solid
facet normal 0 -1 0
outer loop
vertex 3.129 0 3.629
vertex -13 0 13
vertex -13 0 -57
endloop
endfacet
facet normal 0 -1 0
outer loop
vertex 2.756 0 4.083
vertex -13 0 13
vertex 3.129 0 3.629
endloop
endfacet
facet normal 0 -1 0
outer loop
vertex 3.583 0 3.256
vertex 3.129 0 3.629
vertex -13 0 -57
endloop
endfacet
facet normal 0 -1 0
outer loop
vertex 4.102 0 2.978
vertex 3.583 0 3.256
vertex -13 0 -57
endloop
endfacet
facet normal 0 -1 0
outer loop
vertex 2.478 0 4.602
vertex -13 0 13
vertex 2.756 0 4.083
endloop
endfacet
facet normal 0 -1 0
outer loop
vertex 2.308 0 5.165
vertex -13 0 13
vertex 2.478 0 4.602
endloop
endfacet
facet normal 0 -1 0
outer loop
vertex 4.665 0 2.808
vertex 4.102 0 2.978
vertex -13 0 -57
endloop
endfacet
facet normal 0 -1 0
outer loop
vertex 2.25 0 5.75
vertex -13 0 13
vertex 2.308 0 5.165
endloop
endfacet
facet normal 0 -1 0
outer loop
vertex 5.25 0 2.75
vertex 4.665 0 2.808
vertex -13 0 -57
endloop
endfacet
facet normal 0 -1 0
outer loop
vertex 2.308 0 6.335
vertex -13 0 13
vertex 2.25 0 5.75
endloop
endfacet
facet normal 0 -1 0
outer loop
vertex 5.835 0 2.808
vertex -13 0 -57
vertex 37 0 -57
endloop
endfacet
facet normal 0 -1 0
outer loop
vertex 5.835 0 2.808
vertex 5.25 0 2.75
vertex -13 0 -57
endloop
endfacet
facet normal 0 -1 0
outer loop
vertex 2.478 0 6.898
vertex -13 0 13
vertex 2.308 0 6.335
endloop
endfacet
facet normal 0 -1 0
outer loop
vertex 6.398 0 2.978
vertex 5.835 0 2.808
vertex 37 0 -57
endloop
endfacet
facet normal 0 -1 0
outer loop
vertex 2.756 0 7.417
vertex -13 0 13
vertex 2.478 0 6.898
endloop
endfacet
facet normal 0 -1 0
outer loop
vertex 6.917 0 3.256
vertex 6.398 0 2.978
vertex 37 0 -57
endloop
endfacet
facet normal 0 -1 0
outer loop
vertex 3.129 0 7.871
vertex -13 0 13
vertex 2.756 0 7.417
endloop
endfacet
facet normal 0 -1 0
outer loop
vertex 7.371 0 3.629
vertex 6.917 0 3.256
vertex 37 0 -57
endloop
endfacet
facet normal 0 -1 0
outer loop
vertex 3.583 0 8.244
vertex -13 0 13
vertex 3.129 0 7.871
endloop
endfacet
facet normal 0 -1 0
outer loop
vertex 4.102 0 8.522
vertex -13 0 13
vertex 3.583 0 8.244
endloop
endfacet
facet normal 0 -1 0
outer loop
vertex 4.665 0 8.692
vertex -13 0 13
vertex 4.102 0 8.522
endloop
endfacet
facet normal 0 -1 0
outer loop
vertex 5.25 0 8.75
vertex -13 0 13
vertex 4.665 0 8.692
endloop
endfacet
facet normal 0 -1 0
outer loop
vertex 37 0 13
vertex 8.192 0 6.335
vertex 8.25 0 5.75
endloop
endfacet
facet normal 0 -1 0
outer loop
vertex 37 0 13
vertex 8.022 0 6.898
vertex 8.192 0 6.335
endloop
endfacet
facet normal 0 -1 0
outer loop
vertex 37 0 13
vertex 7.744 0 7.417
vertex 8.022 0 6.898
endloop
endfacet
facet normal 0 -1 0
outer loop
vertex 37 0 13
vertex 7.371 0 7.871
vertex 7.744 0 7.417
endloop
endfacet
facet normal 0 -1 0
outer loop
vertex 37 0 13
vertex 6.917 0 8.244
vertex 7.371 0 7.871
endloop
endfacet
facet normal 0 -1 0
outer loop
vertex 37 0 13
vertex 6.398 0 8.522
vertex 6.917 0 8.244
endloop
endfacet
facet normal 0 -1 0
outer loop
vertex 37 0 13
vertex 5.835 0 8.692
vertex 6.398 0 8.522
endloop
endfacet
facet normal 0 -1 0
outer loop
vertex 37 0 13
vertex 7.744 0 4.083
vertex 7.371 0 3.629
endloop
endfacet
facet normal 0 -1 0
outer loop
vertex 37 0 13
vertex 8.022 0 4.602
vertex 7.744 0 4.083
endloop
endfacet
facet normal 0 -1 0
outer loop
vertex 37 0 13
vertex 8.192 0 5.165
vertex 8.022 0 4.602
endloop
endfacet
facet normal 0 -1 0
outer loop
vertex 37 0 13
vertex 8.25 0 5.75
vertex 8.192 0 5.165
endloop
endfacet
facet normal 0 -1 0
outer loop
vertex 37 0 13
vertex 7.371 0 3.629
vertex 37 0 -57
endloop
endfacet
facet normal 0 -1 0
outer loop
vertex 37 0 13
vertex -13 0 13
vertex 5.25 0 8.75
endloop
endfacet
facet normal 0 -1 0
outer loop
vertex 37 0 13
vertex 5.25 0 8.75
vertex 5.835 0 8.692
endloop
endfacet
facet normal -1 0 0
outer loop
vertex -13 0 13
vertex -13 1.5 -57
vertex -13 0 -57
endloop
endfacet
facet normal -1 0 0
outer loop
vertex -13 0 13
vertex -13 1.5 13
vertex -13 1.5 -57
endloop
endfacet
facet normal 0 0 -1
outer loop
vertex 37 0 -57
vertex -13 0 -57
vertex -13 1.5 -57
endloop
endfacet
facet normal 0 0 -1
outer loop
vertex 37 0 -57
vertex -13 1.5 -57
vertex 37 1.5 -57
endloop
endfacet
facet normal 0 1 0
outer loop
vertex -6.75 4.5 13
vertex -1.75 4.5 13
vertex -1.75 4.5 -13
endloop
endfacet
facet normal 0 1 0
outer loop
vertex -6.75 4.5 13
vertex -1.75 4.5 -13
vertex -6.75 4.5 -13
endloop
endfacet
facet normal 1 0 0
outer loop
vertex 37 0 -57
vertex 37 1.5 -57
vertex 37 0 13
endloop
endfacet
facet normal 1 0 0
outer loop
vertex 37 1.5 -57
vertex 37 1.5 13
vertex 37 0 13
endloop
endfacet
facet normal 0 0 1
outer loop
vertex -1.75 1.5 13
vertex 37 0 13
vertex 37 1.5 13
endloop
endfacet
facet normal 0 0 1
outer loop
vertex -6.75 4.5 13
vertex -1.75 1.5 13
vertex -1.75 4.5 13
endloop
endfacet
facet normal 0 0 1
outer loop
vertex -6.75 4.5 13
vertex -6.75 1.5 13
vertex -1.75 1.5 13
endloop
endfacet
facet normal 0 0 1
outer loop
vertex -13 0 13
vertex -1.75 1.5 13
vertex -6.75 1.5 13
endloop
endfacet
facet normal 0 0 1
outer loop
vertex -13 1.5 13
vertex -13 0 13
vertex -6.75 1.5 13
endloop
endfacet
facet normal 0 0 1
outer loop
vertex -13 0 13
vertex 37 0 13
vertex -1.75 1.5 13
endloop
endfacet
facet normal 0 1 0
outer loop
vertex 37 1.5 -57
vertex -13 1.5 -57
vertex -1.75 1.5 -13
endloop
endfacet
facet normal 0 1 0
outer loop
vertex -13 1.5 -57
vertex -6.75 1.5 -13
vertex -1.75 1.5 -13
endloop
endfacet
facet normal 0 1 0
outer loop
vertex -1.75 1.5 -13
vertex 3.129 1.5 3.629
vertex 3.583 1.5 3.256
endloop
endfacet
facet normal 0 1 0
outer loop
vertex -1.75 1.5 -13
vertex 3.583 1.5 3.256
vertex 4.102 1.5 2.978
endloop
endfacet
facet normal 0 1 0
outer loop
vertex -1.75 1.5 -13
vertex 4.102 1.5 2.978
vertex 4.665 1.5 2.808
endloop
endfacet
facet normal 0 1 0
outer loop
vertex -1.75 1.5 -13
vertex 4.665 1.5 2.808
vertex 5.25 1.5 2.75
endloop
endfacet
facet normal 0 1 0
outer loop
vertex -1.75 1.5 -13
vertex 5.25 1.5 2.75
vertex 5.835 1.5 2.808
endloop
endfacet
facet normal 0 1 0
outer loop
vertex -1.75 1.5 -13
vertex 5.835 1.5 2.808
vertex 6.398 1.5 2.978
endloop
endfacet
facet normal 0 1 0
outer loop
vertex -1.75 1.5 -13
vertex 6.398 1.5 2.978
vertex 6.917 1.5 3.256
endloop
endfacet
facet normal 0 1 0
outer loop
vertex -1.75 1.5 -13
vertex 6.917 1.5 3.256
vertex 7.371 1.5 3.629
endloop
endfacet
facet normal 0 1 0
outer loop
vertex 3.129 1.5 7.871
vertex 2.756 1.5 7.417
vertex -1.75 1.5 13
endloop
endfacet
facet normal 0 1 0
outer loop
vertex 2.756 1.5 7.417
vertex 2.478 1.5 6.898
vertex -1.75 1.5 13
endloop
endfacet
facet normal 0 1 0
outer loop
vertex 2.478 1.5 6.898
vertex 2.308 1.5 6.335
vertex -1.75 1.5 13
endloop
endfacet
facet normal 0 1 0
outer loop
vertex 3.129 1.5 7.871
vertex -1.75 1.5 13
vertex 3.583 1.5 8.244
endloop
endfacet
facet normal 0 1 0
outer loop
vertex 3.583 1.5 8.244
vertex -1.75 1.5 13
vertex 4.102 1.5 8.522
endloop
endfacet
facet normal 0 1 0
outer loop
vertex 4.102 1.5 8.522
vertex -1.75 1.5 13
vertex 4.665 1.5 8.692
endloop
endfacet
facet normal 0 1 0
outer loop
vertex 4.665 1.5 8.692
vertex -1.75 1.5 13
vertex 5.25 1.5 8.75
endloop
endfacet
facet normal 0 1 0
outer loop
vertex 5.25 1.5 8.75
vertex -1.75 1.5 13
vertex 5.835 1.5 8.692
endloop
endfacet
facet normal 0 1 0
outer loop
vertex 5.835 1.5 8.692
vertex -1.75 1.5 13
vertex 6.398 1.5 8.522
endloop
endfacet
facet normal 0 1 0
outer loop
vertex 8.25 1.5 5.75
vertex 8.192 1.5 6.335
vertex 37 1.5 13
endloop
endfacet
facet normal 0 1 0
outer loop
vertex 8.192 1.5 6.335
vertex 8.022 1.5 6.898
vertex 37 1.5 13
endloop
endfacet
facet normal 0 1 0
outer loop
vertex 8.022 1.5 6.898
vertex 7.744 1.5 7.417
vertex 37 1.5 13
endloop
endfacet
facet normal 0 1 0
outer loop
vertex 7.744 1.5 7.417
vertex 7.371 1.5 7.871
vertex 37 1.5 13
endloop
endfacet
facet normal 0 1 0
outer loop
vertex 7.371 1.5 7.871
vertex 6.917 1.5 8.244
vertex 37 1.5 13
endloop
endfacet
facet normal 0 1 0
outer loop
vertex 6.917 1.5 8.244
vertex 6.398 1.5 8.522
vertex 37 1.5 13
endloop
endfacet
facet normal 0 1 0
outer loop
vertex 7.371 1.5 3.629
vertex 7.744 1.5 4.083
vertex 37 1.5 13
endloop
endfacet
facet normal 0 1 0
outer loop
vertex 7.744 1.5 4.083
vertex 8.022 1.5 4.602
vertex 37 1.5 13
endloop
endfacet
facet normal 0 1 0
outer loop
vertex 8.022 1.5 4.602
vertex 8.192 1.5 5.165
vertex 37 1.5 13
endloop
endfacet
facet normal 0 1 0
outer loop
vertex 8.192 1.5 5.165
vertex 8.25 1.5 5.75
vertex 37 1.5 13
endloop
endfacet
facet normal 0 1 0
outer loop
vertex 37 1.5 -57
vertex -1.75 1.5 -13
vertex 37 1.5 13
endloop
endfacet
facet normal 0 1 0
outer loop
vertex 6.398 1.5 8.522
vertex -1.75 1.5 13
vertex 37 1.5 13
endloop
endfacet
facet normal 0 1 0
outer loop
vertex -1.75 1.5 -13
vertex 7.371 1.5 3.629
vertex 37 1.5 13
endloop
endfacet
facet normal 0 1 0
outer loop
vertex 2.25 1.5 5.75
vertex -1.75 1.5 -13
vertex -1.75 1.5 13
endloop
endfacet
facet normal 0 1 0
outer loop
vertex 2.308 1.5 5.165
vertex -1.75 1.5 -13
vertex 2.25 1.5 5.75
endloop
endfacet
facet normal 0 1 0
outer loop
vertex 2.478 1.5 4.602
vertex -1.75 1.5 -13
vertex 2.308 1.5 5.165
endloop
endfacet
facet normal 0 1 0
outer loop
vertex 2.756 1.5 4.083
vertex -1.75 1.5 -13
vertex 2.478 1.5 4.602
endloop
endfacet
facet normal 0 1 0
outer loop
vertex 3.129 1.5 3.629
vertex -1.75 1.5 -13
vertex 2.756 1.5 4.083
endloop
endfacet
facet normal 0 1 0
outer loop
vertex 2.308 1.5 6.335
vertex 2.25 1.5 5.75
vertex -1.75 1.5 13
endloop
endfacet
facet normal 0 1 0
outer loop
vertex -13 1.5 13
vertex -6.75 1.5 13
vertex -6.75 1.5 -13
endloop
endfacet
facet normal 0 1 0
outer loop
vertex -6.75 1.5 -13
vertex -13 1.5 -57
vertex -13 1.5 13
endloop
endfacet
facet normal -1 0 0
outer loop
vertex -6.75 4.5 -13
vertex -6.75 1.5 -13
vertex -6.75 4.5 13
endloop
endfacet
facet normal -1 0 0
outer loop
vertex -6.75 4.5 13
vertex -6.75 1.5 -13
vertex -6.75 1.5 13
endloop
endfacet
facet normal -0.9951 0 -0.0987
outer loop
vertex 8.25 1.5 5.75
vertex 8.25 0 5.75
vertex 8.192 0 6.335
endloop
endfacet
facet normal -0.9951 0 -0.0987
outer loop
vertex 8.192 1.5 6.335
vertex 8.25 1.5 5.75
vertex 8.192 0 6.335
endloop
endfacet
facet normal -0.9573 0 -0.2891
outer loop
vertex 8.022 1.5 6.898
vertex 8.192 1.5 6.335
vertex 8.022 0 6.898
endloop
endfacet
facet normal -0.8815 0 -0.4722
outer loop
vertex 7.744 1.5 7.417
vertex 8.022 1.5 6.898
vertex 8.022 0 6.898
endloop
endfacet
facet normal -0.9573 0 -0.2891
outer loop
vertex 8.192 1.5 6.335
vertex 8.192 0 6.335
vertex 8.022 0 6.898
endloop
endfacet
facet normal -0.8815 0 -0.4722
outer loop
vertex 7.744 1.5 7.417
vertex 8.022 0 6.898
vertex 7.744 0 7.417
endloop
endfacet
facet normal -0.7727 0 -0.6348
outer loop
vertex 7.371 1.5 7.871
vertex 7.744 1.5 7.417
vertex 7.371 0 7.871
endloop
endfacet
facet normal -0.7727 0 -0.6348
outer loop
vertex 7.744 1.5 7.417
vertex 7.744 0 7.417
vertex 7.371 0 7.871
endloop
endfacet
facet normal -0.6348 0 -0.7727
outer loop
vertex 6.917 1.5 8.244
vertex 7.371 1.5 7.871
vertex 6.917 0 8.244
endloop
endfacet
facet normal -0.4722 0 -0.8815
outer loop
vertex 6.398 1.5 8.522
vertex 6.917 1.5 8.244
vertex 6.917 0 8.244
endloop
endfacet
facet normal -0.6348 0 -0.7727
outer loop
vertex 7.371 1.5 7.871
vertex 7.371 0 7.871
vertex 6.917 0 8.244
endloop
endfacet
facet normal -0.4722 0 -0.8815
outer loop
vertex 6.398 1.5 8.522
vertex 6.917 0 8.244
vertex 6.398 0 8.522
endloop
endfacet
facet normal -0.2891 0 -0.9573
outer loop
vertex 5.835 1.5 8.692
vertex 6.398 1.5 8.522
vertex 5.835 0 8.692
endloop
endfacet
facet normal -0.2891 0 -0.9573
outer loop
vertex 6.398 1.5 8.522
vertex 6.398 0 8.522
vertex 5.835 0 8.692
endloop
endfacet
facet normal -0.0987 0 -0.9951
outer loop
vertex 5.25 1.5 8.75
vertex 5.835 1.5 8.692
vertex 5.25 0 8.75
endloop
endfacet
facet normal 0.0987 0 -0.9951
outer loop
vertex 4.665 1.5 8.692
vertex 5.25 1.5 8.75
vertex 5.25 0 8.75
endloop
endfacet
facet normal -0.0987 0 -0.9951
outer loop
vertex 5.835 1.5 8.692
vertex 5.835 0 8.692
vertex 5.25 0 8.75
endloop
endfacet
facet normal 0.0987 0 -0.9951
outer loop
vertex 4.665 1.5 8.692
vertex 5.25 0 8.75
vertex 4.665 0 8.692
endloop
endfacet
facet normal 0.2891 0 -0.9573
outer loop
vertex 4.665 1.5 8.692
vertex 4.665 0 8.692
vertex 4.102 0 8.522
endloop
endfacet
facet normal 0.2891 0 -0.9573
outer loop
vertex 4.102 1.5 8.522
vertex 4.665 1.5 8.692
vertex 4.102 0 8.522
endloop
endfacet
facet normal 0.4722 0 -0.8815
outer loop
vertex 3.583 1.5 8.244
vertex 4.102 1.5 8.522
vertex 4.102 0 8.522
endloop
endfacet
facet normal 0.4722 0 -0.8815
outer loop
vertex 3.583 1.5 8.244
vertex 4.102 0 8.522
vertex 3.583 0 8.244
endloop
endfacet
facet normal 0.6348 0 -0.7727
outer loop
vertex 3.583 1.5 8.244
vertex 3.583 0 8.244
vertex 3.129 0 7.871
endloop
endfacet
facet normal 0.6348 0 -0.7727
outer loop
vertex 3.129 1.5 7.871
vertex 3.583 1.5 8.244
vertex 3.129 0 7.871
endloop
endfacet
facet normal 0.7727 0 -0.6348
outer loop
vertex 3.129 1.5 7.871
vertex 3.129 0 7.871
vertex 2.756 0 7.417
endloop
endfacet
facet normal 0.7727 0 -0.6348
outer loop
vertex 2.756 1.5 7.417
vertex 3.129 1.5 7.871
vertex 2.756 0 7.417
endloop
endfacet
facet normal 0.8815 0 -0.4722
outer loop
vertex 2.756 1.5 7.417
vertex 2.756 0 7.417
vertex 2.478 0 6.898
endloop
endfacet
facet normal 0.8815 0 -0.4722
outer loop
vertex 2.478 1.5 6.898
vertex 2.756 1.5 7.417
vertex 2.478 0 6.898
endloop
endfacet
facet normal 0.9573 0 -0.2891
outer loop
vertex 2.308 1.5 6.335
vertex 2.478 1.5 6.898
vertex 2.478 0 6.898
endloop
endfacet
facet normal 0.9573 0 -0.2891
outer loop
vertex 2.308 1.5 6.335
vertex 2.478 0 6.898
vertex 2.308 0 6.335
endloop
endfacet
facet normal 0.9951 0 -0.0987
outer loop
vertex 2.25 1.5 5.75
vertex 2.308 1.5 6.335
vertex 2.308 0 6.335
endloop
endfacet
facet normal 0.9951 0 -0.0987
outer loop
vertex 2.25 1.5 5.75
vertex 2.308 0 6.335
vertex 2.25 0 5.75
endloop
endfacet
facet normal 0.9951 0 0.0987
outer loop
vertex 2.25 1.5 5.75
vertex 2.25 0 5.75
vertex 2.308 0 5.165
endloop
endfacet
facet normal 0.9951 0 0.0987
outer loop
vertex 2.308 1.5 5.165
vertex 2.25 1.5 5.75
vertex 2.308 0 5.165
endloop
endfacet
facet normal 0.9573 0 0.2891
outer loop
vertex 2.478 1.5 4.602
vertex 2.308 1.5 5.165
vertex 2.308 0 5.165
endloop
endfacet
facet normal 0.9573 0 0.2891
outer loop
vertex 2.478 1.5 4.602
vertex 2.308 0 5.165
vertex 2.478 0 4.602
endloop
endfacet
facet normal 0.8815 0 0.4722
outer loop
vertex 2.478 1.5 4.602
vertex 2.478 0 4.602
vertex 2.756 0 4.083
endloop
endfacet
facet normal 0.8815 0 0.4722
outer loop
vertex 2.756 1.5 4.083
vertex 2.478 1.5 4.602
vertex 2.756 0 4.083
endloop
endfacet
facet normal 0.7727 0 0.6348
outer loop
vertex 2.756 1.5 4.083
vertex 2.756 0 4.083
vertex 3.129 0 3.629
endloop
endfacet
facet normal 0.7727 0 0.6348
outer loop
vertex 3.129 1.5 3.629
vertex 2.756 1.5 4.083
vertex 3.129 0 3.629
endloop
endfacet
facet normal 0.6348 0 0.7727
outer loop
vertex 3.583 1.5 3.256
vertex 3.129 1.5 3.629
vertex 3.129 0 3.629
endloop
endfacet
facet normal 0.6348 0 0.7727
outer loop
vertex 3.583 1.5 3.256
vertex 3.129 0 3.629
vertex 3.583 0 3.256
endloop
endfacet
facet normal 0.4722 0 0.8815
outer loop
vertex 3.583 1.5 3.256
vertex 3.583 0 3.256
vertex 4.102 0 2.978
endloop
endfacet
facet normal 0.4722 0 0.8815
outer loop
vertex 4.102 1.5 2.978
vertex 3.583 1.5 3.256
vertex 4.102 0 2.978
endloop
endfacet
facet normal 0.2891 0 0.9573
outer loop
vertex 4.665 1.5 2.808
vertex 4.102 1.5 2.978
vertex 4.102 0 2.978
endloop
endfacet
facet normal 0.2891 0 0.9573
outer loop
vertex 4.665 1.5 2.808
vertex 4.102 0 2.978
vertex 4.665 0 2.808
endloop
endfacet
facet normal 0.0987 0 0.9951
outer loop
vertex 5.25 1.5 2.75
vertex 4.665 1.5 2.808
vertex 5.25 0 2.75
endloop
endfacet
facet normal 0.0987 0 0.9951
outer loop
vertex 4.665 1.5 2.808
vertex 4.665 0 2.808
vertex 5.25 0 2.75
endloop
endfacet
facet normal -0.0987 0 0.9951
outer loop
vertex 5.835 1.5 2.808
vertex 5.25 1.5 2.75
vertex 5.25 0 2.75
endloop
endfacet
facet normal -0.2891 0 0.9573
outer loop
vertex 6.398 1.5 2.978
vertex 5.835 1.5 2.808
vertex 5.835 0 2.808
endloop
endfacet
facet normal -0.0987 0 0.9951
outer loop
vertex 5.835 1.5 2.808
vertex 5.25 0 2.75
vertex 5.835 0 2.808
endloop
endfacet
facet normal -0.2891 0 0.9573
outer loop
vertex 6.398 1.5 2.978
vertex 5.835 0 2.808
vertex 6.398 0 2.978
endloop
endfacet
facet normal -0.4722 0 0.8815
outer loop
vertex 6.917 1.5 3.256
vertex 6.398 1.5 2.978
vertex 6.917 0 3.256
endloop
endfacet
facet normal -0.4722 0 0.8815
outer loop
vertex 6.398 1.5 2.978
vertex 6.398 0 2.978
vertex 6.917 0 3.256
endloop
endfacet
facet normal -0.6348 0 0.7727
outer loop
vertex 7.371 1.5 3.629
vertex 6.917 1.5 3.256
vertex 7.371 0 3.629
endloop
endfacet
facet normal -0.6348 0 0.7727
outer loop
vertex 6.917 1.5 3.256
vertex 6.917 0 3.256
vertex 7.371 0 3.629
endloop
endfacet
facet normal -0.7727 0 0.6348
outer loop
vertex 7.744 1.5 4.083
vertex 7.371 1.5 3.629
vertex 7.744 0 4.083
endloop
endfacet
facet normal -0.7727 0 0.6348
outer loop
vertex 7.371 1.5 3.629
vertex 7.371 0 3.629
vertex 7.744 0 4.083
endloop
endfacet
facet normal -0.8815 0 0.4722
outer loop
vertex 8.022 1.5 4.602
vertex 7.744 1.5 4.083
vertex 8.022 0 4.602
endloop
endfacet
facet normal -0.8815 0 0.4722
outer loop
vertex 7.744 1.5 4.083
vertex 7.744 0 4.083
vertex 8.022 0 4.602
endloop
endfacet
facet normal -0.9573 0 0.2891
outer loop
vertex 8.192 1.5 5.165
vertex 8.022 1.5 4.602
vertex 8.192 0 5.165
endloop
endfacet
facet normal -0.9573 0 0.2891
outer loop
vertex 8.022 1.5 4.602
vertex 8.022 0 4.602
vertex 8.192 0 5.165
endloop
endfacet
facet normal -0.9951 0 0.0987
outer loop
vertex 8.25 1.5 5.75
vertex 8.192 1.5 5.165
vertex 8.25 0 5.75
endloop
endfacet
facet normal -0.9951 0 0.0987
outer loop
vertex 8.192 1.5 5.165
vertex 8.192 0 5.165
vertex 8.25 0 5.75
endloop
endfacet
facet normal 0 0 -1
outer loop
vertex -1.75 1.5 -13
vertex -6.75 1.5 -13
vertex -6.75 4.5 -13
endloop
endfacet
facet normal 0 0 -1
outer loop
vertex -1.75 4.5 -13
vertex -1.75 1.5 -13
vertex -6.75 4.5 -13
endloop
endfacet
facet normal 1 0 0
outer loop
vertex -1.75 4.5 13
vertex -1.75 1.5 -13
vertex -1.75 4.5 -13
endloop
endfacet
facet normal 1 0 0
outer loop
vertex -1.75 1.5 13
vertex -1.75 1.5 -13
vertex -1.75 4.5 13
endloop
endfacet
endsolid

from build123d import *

# Parameters (mm, degrees)
F0_W     = 26
F0_H     = 26
F1_DEPTH = 1.5
F2_W     = 5
F2_H     = 26
F3_DEPTH = 3
F4_R     = 3
F5_DEPTH = 25
F6_DEPTH = 24
F7_W     = 50
F7_H     = 1.5
F8_DEPTH = 44


with BuildPart() as f1:
    # F0 (on Front) → F1 (new body)
    with BuildSketch(Plane.XZ):
        Rectangle(F0_W, F0_H)
    extrude(amount=-F1_DEPTH)

    # F2 (on face) → F3 (join)
    with BuildSketch(Plane(origin=(0, 1.5, 0), x_dir=(-1, 0, 0), z_dir=(0, 1, 0))):
        with Locations((4.25, 0)):
            Rectangle(F2_W, F2_H)
    extrude(amount=F3_DEPTH)

    # F4 (on face) → F5 (cut)
    with BuildSketch(Plane.XZ):
        with Locations((5.25, 5.75)):
            Circle(F4_R)
    extrude(amount=-F5_DEPTH, mode=Mode.SUBTRACT)

    # F6 (add): a face of the model
    f6_faces = [f1.faces().sort_by_distance(p)[0] for p in [
        (13, 0.75, 0),
    ]]
    extrude(f6_faces, amount=F6_DEPTH)

    # F7 (on face) → F8 (join)
    with BuildSketch(Plane(origin=(0, 0, -13), x_dir=(1, 0, 0), z_dir=(0, 0, -1))):
        with Locations((12, -0.75)):
            Rectangle(F7_W, F7_H)
    extrude(amount=F8_DEPTH)


solid = f1.part
